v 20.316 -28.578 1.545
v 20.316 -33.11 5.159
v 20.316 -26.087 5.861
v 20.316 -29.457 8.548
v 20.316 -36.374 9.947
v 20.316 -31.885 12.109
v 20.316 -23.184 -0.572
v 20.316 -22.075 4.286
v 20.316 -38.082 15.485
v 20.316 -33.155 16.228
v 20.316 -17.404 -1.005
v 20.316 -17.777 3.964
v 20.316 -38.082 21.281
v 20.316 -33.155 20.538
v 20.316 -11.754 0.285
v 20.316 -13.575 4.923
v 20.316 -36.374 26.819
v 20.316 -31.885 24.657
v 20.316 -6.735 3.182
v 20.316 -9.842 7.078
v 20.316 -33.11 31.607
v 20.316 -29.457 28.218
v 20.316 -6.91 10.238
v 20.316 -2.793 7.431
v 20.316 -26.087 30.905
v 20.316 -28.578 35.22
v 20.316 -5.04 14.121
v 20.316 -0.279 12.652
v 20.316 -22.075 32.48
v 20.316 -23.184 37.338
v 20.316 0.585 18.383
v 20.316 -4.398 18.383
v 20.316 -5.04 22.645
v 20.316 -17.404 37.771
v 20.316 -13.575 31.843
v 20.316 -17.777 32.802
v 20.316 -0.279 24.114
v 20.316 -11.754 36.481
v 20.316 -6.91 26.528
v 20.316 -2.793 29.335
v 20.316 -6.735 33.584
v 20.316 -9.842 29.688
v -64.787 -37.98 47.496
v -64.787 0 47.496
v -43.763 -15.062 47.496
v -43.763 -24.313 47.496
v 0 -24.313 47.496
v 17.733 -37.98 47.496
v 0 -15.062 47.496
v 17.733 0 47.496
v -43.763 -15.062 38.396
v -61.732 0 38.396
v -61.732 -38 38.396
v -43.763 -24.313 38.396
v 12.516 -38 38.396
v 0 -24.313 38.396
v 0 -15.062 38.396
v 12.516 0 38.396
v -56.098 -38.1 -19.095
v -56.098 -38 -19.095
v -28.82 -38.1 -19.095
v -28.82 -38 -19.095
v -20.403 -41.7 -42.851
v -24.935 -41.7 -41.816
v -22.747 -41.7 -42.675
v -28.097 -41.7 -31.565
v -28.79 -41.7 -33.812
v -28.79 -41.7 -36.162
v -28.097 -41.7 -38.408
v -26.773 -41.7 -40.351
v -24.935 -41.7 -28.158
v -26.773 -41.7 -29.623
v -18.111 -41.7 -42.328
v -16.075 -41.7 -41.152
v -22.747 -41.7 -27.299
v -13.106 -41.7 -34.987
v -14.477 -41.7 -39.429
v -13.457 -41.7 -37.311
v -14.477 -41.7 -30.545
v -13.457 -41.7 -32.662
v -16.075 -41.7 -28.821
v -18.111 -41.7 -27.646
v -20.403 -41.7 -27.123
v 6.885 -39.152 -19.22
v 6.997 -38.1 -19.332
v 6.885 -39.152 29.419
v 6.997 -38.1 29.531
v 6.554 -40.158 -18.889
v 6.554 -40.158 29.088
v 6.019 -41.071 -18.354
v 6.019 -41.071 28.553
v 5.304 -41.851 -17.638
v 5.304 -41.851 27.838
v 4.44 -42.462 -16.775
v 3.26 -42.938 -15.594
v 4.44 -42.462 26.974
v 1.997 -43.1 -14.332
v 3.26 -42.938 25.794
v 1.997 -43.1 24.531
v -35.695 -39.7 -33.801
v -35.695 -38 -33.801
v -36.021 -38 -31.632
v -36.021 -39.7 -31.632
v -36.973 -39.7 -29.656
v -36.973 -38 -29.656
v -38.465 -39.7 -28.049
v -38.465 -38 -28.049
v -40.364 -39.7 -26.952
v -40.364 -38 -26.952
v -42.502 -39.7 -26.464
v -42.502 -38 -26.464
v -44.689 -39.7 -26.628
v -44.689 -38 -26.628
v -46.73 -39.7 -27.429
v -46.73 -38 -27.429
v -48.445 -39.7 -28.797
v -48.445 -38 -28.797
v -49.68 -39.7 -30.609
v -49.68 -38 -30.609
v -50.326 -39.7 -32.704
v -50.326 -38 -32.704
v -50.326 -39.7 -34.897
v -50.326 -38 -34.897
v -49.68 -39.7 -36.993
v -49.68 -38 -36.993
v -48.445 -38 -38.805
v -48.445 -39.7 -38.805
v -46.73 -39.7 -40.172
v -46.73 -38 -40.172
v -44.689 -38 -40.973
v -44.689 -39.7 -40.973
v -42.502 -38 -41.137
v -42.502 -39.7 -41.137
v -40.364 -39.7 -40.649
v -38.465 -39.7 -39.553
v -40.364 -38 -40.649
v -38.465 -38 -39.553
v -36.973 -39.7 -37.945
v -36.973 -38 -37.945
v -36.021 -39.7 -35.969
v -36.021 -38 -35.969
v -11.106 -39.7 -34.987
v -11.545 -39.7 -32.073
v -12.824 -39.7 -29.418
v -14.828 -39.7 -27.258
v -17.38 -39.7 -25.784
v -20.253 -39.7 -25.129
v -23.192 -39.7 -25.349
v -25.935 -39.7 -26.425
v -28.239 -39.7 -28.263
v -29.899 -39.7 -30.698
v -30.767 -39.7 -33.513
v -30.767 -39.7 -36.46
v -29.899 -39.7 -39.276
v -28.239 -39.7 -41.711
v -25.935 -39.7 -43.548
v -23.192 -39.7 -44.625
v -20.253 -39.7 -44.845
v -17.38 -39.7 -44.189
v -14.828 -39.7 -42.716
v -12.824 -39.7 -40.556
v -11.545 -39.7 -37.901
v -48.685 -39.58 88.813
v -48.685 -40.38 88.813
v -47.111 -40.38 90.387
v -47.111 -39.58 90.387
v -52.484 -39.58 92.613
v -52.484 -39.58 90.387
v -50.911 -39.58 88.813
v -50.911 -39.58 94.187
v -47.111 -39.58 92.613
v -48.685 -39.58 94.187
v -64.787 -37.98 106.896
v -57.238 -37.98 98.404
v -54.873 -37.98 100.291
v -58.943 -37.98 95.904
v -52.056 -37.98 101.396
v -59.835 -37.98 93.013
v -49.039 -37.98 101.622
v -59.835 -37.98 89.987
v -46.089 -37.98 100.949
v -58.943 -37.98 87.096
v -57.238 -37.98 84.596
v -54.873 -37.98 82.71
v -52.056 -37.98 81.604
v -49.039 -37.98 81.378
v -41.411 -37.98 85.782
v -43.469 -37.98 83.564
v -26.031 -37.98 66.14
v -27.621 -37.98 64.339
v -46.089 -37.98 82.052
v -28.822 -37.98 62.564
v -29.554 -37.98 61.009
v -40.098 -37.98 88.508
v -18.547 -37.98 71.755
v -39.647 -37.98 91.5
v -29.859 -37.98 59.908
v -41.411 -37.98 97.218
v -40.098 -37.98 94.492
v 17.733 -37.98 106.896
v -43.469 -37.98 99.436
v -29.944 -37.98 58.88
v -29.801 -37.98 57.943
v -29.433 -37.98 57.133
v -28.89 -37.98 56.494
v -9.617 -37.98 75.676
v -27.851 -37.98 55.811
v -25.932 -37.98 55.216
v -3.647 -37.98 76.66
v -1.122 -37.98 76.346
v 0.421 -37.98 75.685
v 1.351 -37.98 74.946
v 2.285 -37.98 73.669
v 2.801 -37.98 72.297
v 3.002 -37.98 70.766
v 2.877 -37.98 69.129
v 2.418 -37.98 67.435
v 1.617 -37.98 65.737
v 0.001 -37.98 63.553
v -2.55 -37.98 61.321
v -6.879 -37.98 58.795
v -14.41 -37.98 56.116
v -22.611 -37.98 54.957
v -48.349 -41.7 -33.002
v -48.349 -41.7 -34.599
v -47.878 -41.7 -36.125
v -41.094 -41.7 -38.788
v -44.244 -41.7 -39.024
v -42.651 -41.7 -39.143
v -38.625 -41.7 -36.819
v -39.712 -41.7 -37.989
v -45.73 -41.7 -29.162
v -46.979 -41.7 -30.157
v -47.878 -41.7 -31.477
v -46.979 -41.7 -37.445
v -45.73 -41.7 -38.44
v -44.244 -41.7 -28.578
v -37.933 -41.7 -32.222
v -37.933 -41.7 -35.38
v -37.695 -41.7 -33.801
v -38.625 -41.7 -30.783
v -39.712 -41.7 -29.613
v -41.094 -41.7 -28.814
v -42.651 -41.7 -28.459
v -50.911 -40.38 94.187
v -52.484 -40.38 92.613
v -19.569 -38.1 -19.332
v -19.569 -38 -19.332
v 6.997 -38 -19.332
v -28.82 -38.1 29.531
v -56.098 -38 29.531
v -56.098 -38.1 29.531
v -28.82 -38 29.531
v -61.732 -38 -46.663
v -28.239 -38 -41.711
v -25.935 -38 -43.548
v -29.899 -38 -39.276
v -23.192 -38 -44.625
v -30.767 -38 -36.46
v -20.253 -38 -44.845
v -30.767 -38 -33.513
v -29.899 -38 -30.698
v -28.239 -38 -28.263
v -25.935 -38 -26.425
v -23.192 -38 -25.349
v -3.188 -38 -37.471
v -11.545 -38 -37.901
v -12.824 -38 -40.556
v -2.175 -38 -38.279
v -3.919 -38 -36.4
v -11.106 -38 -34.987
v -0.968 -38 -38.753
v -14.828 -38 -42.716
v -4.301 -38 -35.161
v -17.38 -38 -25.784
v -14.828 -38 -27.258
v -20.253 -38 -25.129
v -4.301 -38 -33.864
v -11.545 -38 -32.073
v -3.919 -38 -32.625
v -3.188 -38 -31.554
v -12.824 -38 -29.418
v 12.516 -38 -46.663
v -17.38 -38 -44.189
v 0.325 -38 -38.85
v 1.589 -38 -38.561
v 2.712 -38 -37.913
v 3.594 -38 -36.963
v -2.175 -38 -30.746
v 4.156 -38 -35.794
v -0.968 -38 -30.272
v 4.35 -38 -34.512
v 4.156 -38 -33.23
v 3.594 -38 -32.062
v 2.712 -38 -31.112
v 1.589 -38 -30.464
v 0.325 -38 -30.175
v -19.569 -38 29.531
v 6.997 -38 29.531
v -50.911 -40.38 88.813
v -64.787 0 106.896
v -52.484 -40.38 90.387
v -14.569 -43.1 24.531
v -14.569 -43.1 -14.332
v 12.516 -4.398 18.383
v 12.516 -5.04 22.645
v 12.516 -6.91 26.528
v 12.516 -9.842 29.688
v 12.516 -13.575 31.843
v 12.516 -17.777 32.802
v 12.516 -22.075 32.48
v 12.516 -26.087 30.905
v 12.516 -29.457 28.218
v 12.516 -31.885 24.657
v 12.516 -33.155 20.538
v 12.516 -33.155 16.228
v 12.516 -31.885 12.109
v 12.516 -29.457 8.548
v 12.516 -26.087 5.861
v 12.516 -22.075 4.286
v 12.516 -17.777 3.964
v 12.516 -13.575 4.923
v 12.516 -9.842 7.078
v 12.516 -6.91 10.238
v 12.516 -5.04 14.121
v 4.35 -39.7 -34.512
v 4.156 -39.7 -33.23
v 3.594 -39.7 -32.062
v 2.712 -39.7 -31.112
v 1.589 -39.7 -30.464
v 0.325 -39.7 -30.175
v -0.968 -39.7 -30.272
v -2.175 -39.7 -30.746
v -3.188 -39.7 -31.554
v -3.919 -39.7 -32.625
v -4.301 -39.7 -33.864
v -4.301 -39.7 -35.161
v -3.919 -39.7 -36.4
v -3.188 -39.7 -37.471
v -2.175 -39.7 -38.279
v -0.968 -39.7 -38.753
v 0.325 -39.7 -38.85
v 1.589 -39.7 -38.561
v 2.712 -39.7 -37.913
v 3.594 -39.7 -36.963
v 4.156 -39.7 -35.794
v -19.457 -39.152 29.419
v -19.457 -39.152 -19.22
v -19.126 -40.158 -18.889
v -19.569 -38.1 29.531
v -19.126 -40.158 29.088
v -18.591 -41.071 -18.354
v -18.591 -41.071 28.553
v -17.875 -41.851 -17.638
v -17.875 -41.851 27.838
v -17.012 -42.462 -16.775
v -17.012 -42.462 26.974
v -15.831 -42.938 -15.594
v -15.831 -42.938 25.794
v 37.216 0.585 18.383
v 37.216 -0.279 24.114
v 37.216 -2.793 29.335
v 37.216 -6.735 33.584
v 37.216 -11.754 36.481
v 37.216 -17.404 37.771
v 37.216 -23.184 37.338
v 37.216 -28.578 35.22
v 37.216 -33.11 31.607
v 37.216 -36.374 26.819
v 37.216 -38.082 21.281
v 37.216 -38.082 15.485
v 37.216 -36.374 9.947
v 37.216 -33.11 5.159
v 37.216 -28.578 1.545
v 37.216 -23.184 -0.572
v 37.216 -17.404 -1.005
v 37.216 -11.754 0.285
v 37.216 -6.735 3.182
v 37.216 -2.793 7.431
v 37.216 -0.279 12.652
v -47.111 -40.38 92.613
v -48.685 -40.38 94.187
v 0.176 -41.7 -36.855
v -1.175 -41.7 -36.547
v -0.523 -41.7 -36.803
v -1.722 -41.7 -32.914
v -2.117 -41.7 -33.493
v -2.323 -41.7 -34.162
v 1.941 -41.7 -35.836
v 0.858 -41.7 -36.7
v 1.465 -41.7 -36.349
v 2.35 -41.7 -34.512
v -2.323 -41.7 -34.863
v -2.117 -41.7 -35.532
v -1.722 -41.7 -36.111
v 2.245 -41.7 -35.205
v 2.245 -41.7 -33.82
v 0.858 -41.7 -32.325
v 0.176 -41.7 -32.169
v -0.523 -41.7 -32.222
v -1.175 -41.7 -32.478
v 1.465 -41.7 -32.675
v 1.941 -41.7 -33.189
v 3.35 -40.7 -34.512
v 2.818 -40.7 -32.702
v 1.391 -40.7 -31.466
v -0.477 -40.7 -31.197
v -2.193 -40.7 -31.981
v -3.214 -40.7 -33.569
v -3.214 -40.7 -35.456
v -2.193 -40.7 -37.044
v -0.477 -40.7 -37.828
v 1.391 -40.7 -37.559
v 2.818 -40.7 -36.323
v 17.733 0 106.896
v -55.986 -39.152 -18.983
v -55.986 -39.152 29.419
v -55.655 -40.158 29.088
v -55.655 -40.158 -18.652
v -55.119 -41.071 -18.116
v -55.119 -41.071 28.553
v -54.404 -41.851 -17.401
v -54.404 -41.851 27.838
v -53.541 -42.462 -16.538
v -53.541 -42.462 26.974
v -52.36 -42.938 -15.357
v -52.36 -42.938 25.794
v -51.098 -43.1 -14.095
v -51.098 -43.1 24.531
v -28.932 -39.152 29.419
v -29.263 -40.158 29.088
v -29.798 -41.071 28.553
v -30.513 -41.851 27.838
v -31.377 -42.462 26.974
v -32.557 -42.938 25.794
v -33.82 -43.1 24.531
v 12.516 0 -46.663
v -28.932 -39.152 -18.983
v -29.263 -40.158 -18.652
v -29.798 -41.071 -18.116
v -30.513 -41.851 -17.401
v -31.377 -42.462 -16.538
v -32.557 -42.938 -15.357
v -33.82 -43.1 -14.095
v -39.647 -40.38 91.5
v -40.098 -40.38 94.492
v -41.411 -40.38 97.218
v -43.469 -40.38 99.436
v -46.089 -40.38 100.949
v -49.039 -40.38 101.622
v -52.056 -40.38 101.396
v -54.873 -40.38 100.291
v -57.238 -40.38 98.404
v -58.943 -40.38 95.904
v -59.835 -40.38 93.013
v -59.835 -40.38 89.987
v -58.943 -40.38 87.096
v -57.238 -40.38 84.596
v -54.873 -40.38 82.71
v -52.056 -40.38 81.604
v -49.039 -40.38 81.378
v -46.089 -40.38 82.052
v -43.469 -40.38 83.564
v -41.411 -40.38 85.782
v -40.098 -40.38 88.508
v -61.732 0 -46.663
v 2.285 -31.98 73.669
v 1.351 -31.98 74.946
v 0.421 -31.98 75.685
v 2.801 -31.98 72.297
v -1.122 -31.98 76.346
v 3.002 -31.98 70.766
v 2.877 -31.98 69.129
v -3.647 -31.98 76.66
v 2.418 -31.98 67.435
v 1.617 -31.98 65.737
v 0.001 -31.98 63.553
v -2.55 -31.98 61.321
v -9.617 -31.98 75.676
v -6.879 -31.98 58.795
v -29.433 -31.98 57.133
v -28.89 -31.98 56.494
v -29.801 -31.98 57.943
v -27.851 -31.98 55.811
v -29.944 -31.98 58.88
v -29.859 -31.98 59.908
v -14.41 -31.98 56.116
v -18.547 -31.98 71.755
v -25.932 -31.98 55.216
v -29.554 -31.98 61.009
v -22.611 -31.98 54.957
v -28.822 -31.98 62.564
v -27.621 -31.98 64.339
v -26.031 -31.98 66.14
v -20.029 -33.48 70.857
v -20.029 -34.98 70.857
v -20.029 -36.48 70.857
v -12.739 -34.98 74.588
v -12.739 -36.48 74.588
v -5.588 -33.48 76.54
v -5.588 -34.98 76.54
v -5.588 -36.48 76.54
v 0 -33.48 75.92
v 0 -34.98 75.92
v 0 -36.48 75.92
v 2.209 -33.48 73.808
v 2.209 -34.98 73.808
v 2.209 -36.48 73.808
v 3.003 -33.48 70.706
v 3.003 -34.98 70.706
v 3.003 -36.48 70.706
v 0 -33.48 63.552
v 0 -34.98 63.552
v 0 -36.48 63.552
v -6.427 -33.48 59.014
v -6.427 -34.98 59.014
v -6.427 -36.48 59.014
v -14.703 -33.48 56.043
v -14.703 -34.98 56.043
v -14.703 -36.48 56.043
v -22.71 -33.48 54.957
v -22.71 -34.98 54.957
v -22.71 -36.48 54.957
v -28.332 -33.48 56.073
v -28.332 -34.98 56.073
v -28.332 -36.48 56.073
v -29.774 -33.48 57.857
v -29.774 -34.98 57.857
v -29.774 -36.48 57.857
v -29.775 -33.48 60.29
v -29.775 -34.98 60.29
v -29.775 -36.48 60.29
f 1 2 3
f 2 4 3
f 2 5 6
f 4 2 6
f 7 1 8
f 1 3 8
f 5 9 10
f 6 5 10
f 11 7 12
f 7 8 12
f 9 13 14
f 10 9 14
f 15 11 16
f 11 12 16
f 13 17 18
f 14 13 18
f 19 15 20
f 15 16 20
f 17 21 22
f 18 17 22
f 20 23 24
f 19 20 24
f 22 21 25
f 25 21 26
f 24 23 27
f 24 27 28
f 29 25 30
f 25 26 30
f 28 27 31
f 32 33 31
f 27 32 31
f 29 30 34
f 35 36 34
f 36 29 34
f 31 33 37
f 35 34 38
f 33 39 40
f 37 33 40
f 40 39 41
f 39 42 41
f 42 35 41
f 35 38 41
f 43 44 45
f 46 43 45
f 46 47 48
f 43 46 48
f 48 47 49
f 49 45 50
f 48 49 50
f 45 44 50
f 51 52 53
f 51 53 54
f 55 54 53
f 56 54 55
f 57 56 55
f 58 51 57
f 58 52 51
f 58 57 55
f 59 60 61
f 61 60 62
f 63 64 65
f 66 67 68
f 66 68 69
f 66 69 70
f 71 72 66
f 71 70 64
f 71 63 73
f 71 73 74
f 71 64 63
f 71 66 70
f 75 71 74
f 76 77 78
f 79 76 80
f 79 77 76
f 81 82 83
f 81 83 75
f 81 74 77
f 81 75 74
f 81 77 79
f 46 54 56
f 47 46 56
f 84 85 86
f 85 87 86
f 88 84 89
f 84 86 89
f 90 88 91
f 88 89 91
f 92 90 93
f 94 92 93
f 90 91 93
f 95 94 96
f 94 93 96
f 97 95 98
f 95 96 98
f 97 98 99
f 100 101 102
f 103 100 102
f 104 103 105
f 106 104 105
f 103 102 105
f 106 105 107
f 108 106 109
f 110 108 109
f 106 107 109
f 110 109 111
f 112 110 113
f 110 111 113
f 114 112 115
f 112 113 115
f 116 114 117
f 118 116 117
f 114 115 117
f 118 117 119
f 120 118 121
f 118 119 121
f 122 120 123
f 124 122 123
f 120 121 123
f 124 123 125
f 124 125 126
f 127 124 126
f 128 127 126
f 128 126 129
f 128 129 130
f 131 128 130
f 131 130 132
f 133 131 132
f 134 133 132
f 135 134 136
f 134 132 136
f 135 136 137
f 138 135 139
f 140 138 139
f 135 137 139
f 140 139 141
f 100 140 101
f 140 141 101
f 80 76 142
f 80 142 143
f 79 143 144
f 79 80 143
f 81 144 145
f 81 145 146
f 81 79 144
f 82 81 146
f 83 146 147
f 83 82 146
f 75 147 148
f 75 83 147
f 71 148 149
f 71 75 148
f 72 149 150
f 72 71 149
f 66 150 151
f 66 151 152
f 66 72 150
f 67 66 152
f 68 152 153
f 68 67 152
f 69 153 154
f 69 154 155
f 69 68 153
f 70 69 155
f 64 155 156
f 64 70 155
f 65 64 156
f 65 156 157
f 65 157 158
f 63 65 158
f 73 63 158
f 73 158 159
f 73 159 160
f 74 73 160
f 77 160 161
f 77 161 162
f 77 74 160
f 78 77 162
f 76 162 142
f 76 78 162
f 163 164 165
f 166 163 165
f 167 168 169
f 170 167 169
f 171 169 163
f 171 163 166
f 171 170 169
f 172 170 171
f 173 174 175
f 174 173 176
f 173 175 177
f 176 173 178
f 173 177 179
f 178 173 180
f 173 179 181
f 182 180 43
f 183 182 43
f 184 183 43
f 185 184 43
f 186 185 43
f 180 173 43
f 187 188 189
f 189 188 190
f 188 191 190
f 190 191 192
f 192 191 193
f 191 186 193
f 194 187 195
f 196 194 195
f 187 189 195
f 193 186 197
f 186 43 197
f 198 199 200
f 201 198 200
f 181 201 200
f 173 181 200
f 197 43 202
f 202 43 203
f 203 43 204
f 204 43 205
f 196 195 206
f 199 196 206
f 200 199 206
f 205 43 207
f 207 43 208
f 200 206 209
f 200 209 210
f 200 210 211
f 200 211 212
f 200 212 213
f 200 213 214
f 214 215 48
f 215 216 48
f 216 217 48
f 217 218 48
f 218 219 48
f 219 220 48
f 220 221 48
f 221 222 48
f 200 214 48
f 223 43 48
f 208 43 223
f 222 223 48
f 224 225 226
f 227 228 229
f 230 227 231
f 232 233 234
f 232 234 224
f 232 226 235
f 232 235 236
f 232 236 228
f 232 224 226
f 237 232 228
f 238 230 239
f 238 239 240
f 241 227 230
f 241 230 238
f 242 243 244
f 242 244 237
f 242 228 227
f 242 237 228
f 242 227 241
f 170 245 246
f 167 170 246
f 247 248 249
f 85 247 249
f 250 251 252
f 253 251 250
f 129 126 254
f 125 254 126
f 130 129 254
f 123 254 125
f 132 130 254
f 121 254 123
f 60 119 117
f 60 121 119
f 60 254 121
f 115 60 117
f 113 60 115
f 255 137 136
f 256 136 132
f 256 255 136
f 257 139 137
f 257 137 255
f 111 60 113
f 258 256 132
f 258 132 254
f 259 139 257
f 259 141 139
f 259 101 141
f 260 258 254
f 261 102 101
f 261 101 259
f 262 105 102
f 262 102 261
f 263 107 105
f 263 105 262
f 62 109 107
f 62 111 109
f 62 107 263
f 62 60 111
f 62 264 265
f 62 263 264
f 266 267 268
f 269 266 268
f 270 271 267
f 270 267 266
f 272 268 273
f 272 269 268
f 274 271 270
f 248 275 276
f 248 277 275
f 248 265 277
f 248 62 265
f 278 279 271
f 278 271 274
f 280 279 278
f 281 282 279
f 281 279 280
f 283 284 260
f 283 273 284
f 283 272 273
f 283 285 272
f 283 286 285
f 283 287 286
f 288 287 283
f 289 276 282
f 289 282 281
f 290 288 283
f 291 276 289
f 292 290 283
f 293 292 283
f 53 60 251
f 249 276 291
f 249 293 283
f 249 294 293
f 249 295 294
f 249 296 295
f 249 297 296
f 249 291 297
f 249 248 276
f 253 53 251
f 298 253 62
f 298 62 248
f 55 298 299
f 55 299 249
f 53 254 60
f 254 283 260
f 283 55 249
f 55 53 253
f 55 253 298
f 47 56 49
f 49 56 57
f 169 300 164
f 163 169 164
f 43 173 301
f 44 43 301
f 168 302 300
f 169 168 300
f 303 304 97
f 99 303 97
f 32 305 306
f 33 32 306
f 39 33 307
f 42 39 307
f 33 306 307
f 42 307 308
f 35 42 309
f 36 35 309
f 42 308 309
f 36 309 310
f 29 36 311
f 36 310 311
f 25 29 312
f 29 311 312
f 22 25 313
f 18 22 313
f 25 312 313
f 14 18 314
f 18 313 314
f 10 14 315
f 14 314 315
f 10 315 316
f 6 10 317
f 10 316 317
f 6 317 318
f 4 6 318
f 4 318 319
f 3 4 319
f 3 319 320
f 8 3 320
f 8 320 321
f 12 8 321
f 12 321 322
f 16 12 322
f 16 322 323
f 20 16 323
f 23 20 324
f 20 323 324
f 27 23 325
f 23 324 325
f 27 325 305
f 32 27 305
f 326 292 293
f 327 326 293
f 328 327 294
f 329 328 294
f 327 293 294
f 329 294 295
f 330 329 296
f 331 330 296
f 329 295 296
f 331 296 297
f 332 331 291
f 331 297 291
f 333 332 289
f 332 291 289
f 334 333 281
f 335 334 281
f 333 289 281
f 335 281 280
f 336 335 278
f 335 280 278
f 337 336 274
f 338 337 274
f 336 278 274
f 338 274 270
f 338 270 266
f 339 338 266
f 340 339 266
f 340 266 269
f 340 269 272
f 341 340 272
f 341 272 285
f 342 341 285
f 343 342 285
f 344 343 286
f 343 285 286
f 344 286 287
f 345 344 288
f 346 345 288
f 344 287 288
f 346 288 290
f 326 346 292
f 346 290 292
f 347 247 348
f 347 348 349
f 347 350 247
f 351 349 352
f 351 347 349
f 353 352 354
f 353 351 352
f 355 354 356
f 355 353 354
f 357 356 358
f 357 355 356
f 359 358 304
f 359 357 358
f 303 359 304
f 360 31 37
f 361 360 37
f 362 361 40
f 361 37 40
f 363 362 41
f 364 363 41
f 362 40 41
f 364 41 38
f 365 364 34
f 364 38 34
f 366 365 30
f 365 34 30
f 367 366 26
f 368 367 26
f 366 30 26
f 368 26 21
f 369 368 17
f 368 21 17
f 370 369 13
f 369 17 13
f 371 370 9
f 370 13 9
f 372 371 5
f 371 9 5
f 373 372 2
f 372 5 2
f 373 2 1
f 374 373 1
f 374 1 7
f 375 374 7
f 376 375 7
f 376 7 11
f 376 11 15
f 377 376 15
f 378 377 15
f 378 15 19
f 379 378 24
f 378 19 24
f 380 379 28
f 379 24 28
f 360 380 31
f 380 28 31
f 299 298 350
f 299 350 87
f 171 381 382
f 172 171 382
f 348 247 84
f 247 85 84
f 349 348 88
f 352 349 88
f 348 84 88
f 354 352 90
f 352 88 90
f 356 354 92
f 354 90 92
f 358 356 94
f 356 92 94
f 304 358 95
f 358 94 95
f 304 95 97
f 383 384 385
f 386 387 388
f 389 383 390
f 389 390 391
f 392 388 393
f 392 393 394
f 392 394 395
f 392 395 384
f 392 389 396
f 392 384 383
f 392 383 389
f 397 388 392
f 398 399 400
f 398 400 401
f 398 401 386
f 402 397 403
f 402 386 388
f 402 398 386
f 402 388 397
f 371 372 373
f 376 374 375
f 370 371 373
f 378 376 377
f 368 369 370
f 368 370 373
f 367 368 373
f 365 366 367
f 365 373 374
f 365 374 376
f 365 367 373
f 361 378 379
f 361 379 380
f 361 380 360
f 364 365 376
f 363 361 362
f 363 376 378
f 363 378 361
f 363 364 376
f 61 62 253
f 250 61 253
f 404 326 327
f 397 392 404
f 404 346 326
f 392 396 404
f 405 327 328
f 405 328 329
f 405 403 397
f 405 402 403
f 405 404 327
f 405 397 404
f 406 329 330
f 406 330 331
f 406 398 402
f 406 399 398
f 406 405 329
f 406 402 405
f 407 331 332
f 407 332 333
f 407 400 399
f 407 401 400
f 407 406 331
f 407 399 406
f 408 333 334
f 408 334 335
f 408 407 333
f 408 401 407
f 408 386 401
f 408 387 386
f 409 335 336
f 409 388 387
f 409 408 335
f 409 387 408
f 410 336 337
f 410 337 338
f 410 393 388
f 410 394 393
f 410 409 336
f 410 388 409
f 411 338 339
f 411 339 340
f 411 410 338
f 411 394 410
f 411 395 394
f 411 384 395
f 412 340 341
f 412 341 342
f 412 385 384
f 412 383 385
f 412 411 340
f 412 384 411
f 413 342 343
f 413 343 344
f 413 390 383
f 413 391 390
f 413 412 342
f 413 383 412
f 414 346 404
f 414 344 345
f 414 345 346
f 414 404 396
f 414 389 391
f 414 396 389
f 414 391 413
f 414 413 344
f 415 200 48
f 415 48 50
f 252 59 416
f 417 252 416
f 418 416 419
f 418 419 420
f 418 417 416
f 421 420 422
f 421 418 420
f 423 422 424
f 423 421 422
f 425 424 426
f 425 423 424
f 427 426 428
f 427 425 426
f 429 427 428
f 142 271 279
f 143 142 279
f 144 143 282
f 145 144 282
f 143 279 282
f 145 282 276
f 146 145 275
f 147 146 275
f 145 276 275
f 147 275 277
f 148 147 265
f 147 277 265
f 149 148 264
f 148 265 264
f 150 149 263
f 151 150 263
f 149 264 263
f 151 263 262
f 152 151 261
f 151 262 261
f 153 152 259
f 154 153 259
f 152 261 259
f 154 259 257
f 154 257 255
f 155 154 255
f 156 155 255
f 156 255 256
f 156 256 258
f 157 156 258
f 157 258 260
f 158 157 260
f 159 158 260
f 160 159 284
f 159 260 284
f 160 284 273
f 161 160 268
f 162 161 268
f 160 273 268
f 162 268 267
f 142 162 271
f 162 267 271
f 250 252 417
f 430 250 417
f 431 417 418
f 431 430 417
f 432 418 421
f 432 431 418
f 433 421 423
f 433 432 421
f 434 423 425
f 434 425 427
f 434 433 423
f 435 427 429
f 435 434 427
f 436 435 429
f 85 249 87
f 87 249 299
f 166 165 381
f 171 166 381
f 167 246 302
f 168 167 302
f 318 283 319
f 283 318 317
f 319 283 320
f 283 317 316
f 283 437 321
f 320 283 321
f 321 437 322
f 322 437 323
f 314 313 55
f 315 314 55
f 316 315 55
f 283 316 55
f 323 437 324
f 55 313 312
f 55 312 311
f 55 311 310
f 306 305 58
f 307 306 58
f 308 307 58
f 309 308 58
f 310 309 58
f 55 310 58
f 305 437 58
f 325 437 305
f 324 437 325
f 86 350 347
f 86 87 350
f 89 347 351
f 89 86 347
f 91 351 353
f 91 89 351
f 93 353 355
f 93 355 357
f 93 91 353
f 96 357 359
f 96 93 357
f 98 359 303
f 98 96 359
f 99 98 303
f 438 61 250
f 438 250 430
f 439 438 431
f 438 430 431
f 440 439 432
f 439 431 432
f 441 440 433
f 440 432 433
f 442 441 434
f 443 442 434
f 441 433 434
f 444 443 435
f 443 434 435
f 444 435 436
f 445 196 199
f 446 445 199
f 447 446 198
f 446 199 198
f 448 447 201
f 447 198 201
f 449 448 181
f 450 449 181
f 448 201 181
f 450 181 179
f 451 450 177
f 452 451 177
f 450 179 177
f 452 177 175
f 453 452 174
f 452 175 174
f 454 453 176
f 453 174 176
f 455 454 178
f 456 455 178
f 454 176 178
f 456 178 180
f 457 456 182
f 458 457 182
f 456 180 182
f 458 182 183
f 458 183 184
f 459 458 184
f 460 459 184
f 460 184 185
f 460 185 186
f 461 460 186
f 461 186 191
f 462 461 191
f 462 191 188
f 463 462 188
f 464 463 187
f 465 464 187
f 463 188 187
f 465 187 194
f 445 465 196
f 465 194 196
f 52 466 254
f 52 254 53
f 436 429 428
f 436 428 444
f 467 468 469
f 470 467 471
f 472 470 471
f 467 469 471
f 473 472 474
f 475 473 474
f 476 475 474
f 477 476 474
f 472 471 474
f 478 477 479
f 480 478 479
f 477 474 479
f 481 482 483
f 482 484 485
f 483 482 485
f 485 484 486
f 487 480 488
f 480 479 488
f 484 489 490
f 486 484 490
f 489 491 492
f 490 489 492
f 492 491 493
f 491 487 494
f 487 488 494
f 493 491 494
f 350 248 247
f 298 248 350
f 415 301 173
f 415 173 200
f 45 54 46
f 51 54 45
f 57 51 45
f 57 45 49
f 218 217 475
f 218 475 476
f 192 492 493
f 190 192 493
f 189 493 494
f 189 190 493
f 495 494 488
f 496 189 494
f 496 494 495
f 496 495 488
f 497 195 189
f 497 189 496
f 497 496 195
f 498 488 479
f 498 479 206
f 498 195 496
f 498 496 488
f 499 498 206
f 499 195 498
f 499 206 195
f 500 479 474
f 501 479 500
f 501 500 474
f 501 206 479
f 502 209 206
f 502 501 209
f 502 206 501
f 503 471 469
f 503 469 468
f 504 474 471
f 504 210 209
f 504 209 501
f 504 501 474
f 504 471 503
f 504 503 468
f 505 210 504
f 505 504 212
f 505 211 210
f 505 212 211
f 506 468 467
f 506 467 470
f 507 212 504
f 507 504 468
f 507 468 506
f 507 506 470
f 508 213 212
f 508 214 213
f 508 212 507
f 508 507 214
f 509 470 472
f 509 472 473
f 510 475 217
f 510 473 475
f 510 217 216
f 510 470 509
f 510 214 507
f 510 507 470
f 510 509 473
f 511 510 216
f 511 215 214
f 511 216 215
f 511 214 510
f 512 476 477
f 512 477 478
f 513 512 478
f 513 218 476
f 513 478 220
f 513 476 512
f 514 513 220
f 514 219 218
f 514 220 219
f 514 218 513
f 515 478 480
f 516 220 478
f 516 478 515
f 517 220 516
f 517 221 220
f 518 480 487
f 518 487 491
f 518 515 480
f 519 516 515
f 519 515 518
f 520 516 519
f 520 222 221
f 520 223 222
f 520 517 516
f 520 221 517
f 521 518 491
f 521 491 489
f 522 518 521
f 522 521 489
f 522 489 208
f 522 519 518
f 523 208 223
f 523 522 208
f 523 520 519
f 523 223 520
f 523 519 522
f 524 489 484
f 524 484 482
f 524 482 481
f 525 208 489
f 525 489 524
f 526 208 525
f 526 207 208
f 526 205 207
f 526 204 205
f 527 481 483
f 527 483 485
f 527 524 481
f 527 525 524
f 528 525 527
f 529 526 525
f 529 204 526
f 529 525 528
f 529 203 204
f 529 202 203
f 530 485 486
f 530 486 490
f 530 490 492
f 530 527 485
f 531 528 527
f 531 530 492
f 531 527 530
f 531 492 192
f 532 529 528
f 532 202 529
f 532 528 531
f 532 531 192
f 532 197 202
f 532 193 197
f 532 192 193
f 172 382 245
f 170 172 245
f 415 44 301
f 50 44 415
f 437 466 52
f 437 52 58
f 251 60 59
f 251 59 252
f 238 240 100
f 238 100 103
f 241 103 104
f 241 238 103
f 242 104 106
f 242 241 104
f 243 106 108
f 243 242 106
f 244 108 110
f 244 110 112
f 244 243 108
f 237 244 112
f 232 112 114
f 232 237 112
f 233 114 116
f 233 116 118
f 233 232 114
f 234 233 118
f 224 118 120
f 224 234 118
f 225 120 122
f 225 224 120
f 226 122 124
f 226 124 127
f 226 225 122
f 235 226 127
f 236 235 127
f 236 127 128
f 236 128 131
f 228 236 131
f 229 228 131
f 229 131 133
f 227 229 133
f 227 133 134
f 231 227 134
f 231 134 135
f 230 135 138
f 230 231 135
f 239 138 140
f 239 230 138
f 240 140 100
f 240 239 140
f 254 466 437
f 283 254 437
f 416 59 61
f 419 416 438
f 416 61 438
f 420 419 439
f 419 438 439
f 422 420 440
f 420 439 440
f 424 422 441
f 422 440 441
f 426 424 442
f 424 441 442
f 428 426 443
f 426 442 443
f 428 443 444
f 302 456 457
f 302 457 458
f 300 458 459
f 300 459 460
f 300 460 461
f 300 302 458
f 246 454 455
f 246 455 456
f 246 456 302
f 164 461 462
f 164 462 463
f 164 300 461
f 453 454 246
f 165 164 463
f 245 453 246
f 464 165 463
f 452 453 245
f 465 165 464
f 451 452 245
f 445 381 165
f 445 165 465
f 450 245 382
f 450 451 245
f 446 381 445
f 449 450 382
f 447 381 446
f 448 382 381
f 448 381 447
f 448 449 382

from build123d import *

# Parameters (mm, degrees)
F0_W      = 74.2475399747
F0_H      = 85.0587636232
F1_DEPTH  = 38
F2_W      = 27.2778645158
F2_H      = 48.6257560551
F2_W_2    = 26.5662674792
F2_H_2    = 48.8629546016
F3_DEPTH  = 5.1
F4_R      = 5
F5_R      = 7.356985616
F5_R_2    = 9.8858115492
F5_R_3    = 4.3495434343
F6_DEPTH  = 3.7
F7_SIZE   = 2
F8_R      = 14.4594029366
F9_DEPTH  = 7.8
F10_R     = 19.4422944141
F11_DEPTH = 16.9
F12_W     = 43.763179332
F12_H     = 9.2507535592
F13_DEPTH = 9.1
F14_W     = 82.5197082013
F14_H     = 37.9795394838
F15_DEPTH = 59.4
F17_DEPTH = 6
F18_R     = 10.1503328775
F19_DEPTH = 2.4
F21_DEPTH = 0.8


with BuildPart() as f1:
    # F0 (on Front) → F1 (new body)
    with BuildSketch(Plane.XZ):
        with Locations((-24.6077510528, -4.1337423027)):
            Rectangle(F0_W, F0_H)
    extrude(amount=F1_DEPTH)

    # F2 (on face) → F3 (join)
    with BuildSketch(Plane.XZ.offset(38)):
        with Locations((-42.4585863948, 5.2183736116)):
            Rectangle(F2_W, F2_H)
        with Locations((-6.2857677694, 5.0997743383)):
            Rectangle(F2_W_2, F2_H_2)
    extrude(amount=F3_DEPTH)

    # F4
    f4_edges = [f1.edges().sort_by_distance(p)[0] for p in [
        (-42.458586, -43.1, 29.531252),
        (-6.285768, -43.1, 29.531252),
        (-6.285768, -43.1, -19.331703),
        (-42.458586, -43.1, -19.094504),
        (-19.568902, -43.1, 5.099774),
        (-28.819654, -43.1, 5.218374),
        (-56.097519, -43.1, 5.218374),
        (6.997366, -43.1, 5.099774),
    ]]
    fillet(f4_edges, radius=F4_R)

    # F5 (on face) → F6 (join)
    with BuildSketch(Plane.XZ.offset(38)):
        with Locations((-43.0515818298, -33.8008292019)):
            Circle(F5_R)
        with Locations((-20.9920946509, -34.9868237972)):
            Circle(F5_R_2)
        with Locations((0, -34.5124267042)):
            Circle(F5_R_3)
    extrude(amount=F6_DEPTH)

    # F7
    f7_edges = [f1.edges().sort_by_distance(p)[0] for p in [
        (-50.408567, -41.7, -33.800829),
        (-30.877906, -41.7, -34.986824),
        (-4.349543, -41.7, -34.512427),
    ]]
    chamfer(f7_edges, length=F7_SIZE)

    # F8 (on face) → F9 (join)
    with BuildSketch(Plane.YZ.offset(12.5160189345)):
        with Locations((-18.8573058695, 18.3829069138)):
            Circle(F8_R)
    extrude(amount=F9_DEPTH)

    # F10 (on face) → F11 (join)
    with BuildSketch(Plane.YZ.offset(20.3160189345)):
        with Locations((-18.8573058695, 18.3829069138)):
            Circle(F10_R)
    extrude(amount=F11_DEPTH)

    # F12 (on face) → F13 (join)
    with BuildSketch(Plane.XY.offset(38.395639509)):
        with Locations((-21.881589666, -19.687501248)):
            Rectangle(F12_W, F12_H)
    extrude(amount=F13_DEPTH)

    # F14 (on face) → F15 (join)
    with BuildSketch(Plane.XY.offset(47.495639509)):
        with Locations((-23.5268557444, -18.9897697419)):
            Rectangle(F14_W, F14_H)
    extrude(amount=F15_DEPTH)

    # F16 (on face) → F17 (cut)
    with BuildSketch(Plane.XZ.offset(37.9795394838)):
        with BuildLine():
            add(Edge.make_bspline(
                [(-26.0310750455, 66.1403313279), (-19.5197759633, 72.7342236821), (3.3929896724, 82.8686218481), (4.6264940271, 58.9542461456), (-33.4389955915, 50.822229714), (-29.9990735288, 62.122000342), (-26.0310750455, 66.1403313279)],
                knots=[0, 0, 0, 0, 0.3027684682, 0.5046913629, 0.8154922992, 1, 1, 1, 1], degree=3))
        make_face()
    extrude(amount=-F17_DEPTH, mode=Mode.SUBTRACT)

    # F18 (on face) → F19 (join)
    with BuildSketch(Plane.XZ.offset(37.9795394838)):
        with Locations((-49.7975498438, 91.5002599359)):
            Circle(F18_R)
    extrude(amount=F19_DEPTH)

    # F20 (on face) → F21 (cut)
    with BuildSketch(Plane.XZ.offset(40.3795394838)):
        Polygon((-50.9105199745, 88.8133123517), (-48.684579713, 88.8133123517), (-47.1106022596, 90.3872898051), (-47.1106022596, 92.6132300666), (-48.684579713, 94.18720752), (-50.9105199745, 94.18720752), (-52.4844974279, 92.6132300666), (-52.4844974279, 90.3872898051), align=None)
    extrude(amount=-F21_DEPTH, mode=Mode.SUBTRACT)


solid = f1.part
